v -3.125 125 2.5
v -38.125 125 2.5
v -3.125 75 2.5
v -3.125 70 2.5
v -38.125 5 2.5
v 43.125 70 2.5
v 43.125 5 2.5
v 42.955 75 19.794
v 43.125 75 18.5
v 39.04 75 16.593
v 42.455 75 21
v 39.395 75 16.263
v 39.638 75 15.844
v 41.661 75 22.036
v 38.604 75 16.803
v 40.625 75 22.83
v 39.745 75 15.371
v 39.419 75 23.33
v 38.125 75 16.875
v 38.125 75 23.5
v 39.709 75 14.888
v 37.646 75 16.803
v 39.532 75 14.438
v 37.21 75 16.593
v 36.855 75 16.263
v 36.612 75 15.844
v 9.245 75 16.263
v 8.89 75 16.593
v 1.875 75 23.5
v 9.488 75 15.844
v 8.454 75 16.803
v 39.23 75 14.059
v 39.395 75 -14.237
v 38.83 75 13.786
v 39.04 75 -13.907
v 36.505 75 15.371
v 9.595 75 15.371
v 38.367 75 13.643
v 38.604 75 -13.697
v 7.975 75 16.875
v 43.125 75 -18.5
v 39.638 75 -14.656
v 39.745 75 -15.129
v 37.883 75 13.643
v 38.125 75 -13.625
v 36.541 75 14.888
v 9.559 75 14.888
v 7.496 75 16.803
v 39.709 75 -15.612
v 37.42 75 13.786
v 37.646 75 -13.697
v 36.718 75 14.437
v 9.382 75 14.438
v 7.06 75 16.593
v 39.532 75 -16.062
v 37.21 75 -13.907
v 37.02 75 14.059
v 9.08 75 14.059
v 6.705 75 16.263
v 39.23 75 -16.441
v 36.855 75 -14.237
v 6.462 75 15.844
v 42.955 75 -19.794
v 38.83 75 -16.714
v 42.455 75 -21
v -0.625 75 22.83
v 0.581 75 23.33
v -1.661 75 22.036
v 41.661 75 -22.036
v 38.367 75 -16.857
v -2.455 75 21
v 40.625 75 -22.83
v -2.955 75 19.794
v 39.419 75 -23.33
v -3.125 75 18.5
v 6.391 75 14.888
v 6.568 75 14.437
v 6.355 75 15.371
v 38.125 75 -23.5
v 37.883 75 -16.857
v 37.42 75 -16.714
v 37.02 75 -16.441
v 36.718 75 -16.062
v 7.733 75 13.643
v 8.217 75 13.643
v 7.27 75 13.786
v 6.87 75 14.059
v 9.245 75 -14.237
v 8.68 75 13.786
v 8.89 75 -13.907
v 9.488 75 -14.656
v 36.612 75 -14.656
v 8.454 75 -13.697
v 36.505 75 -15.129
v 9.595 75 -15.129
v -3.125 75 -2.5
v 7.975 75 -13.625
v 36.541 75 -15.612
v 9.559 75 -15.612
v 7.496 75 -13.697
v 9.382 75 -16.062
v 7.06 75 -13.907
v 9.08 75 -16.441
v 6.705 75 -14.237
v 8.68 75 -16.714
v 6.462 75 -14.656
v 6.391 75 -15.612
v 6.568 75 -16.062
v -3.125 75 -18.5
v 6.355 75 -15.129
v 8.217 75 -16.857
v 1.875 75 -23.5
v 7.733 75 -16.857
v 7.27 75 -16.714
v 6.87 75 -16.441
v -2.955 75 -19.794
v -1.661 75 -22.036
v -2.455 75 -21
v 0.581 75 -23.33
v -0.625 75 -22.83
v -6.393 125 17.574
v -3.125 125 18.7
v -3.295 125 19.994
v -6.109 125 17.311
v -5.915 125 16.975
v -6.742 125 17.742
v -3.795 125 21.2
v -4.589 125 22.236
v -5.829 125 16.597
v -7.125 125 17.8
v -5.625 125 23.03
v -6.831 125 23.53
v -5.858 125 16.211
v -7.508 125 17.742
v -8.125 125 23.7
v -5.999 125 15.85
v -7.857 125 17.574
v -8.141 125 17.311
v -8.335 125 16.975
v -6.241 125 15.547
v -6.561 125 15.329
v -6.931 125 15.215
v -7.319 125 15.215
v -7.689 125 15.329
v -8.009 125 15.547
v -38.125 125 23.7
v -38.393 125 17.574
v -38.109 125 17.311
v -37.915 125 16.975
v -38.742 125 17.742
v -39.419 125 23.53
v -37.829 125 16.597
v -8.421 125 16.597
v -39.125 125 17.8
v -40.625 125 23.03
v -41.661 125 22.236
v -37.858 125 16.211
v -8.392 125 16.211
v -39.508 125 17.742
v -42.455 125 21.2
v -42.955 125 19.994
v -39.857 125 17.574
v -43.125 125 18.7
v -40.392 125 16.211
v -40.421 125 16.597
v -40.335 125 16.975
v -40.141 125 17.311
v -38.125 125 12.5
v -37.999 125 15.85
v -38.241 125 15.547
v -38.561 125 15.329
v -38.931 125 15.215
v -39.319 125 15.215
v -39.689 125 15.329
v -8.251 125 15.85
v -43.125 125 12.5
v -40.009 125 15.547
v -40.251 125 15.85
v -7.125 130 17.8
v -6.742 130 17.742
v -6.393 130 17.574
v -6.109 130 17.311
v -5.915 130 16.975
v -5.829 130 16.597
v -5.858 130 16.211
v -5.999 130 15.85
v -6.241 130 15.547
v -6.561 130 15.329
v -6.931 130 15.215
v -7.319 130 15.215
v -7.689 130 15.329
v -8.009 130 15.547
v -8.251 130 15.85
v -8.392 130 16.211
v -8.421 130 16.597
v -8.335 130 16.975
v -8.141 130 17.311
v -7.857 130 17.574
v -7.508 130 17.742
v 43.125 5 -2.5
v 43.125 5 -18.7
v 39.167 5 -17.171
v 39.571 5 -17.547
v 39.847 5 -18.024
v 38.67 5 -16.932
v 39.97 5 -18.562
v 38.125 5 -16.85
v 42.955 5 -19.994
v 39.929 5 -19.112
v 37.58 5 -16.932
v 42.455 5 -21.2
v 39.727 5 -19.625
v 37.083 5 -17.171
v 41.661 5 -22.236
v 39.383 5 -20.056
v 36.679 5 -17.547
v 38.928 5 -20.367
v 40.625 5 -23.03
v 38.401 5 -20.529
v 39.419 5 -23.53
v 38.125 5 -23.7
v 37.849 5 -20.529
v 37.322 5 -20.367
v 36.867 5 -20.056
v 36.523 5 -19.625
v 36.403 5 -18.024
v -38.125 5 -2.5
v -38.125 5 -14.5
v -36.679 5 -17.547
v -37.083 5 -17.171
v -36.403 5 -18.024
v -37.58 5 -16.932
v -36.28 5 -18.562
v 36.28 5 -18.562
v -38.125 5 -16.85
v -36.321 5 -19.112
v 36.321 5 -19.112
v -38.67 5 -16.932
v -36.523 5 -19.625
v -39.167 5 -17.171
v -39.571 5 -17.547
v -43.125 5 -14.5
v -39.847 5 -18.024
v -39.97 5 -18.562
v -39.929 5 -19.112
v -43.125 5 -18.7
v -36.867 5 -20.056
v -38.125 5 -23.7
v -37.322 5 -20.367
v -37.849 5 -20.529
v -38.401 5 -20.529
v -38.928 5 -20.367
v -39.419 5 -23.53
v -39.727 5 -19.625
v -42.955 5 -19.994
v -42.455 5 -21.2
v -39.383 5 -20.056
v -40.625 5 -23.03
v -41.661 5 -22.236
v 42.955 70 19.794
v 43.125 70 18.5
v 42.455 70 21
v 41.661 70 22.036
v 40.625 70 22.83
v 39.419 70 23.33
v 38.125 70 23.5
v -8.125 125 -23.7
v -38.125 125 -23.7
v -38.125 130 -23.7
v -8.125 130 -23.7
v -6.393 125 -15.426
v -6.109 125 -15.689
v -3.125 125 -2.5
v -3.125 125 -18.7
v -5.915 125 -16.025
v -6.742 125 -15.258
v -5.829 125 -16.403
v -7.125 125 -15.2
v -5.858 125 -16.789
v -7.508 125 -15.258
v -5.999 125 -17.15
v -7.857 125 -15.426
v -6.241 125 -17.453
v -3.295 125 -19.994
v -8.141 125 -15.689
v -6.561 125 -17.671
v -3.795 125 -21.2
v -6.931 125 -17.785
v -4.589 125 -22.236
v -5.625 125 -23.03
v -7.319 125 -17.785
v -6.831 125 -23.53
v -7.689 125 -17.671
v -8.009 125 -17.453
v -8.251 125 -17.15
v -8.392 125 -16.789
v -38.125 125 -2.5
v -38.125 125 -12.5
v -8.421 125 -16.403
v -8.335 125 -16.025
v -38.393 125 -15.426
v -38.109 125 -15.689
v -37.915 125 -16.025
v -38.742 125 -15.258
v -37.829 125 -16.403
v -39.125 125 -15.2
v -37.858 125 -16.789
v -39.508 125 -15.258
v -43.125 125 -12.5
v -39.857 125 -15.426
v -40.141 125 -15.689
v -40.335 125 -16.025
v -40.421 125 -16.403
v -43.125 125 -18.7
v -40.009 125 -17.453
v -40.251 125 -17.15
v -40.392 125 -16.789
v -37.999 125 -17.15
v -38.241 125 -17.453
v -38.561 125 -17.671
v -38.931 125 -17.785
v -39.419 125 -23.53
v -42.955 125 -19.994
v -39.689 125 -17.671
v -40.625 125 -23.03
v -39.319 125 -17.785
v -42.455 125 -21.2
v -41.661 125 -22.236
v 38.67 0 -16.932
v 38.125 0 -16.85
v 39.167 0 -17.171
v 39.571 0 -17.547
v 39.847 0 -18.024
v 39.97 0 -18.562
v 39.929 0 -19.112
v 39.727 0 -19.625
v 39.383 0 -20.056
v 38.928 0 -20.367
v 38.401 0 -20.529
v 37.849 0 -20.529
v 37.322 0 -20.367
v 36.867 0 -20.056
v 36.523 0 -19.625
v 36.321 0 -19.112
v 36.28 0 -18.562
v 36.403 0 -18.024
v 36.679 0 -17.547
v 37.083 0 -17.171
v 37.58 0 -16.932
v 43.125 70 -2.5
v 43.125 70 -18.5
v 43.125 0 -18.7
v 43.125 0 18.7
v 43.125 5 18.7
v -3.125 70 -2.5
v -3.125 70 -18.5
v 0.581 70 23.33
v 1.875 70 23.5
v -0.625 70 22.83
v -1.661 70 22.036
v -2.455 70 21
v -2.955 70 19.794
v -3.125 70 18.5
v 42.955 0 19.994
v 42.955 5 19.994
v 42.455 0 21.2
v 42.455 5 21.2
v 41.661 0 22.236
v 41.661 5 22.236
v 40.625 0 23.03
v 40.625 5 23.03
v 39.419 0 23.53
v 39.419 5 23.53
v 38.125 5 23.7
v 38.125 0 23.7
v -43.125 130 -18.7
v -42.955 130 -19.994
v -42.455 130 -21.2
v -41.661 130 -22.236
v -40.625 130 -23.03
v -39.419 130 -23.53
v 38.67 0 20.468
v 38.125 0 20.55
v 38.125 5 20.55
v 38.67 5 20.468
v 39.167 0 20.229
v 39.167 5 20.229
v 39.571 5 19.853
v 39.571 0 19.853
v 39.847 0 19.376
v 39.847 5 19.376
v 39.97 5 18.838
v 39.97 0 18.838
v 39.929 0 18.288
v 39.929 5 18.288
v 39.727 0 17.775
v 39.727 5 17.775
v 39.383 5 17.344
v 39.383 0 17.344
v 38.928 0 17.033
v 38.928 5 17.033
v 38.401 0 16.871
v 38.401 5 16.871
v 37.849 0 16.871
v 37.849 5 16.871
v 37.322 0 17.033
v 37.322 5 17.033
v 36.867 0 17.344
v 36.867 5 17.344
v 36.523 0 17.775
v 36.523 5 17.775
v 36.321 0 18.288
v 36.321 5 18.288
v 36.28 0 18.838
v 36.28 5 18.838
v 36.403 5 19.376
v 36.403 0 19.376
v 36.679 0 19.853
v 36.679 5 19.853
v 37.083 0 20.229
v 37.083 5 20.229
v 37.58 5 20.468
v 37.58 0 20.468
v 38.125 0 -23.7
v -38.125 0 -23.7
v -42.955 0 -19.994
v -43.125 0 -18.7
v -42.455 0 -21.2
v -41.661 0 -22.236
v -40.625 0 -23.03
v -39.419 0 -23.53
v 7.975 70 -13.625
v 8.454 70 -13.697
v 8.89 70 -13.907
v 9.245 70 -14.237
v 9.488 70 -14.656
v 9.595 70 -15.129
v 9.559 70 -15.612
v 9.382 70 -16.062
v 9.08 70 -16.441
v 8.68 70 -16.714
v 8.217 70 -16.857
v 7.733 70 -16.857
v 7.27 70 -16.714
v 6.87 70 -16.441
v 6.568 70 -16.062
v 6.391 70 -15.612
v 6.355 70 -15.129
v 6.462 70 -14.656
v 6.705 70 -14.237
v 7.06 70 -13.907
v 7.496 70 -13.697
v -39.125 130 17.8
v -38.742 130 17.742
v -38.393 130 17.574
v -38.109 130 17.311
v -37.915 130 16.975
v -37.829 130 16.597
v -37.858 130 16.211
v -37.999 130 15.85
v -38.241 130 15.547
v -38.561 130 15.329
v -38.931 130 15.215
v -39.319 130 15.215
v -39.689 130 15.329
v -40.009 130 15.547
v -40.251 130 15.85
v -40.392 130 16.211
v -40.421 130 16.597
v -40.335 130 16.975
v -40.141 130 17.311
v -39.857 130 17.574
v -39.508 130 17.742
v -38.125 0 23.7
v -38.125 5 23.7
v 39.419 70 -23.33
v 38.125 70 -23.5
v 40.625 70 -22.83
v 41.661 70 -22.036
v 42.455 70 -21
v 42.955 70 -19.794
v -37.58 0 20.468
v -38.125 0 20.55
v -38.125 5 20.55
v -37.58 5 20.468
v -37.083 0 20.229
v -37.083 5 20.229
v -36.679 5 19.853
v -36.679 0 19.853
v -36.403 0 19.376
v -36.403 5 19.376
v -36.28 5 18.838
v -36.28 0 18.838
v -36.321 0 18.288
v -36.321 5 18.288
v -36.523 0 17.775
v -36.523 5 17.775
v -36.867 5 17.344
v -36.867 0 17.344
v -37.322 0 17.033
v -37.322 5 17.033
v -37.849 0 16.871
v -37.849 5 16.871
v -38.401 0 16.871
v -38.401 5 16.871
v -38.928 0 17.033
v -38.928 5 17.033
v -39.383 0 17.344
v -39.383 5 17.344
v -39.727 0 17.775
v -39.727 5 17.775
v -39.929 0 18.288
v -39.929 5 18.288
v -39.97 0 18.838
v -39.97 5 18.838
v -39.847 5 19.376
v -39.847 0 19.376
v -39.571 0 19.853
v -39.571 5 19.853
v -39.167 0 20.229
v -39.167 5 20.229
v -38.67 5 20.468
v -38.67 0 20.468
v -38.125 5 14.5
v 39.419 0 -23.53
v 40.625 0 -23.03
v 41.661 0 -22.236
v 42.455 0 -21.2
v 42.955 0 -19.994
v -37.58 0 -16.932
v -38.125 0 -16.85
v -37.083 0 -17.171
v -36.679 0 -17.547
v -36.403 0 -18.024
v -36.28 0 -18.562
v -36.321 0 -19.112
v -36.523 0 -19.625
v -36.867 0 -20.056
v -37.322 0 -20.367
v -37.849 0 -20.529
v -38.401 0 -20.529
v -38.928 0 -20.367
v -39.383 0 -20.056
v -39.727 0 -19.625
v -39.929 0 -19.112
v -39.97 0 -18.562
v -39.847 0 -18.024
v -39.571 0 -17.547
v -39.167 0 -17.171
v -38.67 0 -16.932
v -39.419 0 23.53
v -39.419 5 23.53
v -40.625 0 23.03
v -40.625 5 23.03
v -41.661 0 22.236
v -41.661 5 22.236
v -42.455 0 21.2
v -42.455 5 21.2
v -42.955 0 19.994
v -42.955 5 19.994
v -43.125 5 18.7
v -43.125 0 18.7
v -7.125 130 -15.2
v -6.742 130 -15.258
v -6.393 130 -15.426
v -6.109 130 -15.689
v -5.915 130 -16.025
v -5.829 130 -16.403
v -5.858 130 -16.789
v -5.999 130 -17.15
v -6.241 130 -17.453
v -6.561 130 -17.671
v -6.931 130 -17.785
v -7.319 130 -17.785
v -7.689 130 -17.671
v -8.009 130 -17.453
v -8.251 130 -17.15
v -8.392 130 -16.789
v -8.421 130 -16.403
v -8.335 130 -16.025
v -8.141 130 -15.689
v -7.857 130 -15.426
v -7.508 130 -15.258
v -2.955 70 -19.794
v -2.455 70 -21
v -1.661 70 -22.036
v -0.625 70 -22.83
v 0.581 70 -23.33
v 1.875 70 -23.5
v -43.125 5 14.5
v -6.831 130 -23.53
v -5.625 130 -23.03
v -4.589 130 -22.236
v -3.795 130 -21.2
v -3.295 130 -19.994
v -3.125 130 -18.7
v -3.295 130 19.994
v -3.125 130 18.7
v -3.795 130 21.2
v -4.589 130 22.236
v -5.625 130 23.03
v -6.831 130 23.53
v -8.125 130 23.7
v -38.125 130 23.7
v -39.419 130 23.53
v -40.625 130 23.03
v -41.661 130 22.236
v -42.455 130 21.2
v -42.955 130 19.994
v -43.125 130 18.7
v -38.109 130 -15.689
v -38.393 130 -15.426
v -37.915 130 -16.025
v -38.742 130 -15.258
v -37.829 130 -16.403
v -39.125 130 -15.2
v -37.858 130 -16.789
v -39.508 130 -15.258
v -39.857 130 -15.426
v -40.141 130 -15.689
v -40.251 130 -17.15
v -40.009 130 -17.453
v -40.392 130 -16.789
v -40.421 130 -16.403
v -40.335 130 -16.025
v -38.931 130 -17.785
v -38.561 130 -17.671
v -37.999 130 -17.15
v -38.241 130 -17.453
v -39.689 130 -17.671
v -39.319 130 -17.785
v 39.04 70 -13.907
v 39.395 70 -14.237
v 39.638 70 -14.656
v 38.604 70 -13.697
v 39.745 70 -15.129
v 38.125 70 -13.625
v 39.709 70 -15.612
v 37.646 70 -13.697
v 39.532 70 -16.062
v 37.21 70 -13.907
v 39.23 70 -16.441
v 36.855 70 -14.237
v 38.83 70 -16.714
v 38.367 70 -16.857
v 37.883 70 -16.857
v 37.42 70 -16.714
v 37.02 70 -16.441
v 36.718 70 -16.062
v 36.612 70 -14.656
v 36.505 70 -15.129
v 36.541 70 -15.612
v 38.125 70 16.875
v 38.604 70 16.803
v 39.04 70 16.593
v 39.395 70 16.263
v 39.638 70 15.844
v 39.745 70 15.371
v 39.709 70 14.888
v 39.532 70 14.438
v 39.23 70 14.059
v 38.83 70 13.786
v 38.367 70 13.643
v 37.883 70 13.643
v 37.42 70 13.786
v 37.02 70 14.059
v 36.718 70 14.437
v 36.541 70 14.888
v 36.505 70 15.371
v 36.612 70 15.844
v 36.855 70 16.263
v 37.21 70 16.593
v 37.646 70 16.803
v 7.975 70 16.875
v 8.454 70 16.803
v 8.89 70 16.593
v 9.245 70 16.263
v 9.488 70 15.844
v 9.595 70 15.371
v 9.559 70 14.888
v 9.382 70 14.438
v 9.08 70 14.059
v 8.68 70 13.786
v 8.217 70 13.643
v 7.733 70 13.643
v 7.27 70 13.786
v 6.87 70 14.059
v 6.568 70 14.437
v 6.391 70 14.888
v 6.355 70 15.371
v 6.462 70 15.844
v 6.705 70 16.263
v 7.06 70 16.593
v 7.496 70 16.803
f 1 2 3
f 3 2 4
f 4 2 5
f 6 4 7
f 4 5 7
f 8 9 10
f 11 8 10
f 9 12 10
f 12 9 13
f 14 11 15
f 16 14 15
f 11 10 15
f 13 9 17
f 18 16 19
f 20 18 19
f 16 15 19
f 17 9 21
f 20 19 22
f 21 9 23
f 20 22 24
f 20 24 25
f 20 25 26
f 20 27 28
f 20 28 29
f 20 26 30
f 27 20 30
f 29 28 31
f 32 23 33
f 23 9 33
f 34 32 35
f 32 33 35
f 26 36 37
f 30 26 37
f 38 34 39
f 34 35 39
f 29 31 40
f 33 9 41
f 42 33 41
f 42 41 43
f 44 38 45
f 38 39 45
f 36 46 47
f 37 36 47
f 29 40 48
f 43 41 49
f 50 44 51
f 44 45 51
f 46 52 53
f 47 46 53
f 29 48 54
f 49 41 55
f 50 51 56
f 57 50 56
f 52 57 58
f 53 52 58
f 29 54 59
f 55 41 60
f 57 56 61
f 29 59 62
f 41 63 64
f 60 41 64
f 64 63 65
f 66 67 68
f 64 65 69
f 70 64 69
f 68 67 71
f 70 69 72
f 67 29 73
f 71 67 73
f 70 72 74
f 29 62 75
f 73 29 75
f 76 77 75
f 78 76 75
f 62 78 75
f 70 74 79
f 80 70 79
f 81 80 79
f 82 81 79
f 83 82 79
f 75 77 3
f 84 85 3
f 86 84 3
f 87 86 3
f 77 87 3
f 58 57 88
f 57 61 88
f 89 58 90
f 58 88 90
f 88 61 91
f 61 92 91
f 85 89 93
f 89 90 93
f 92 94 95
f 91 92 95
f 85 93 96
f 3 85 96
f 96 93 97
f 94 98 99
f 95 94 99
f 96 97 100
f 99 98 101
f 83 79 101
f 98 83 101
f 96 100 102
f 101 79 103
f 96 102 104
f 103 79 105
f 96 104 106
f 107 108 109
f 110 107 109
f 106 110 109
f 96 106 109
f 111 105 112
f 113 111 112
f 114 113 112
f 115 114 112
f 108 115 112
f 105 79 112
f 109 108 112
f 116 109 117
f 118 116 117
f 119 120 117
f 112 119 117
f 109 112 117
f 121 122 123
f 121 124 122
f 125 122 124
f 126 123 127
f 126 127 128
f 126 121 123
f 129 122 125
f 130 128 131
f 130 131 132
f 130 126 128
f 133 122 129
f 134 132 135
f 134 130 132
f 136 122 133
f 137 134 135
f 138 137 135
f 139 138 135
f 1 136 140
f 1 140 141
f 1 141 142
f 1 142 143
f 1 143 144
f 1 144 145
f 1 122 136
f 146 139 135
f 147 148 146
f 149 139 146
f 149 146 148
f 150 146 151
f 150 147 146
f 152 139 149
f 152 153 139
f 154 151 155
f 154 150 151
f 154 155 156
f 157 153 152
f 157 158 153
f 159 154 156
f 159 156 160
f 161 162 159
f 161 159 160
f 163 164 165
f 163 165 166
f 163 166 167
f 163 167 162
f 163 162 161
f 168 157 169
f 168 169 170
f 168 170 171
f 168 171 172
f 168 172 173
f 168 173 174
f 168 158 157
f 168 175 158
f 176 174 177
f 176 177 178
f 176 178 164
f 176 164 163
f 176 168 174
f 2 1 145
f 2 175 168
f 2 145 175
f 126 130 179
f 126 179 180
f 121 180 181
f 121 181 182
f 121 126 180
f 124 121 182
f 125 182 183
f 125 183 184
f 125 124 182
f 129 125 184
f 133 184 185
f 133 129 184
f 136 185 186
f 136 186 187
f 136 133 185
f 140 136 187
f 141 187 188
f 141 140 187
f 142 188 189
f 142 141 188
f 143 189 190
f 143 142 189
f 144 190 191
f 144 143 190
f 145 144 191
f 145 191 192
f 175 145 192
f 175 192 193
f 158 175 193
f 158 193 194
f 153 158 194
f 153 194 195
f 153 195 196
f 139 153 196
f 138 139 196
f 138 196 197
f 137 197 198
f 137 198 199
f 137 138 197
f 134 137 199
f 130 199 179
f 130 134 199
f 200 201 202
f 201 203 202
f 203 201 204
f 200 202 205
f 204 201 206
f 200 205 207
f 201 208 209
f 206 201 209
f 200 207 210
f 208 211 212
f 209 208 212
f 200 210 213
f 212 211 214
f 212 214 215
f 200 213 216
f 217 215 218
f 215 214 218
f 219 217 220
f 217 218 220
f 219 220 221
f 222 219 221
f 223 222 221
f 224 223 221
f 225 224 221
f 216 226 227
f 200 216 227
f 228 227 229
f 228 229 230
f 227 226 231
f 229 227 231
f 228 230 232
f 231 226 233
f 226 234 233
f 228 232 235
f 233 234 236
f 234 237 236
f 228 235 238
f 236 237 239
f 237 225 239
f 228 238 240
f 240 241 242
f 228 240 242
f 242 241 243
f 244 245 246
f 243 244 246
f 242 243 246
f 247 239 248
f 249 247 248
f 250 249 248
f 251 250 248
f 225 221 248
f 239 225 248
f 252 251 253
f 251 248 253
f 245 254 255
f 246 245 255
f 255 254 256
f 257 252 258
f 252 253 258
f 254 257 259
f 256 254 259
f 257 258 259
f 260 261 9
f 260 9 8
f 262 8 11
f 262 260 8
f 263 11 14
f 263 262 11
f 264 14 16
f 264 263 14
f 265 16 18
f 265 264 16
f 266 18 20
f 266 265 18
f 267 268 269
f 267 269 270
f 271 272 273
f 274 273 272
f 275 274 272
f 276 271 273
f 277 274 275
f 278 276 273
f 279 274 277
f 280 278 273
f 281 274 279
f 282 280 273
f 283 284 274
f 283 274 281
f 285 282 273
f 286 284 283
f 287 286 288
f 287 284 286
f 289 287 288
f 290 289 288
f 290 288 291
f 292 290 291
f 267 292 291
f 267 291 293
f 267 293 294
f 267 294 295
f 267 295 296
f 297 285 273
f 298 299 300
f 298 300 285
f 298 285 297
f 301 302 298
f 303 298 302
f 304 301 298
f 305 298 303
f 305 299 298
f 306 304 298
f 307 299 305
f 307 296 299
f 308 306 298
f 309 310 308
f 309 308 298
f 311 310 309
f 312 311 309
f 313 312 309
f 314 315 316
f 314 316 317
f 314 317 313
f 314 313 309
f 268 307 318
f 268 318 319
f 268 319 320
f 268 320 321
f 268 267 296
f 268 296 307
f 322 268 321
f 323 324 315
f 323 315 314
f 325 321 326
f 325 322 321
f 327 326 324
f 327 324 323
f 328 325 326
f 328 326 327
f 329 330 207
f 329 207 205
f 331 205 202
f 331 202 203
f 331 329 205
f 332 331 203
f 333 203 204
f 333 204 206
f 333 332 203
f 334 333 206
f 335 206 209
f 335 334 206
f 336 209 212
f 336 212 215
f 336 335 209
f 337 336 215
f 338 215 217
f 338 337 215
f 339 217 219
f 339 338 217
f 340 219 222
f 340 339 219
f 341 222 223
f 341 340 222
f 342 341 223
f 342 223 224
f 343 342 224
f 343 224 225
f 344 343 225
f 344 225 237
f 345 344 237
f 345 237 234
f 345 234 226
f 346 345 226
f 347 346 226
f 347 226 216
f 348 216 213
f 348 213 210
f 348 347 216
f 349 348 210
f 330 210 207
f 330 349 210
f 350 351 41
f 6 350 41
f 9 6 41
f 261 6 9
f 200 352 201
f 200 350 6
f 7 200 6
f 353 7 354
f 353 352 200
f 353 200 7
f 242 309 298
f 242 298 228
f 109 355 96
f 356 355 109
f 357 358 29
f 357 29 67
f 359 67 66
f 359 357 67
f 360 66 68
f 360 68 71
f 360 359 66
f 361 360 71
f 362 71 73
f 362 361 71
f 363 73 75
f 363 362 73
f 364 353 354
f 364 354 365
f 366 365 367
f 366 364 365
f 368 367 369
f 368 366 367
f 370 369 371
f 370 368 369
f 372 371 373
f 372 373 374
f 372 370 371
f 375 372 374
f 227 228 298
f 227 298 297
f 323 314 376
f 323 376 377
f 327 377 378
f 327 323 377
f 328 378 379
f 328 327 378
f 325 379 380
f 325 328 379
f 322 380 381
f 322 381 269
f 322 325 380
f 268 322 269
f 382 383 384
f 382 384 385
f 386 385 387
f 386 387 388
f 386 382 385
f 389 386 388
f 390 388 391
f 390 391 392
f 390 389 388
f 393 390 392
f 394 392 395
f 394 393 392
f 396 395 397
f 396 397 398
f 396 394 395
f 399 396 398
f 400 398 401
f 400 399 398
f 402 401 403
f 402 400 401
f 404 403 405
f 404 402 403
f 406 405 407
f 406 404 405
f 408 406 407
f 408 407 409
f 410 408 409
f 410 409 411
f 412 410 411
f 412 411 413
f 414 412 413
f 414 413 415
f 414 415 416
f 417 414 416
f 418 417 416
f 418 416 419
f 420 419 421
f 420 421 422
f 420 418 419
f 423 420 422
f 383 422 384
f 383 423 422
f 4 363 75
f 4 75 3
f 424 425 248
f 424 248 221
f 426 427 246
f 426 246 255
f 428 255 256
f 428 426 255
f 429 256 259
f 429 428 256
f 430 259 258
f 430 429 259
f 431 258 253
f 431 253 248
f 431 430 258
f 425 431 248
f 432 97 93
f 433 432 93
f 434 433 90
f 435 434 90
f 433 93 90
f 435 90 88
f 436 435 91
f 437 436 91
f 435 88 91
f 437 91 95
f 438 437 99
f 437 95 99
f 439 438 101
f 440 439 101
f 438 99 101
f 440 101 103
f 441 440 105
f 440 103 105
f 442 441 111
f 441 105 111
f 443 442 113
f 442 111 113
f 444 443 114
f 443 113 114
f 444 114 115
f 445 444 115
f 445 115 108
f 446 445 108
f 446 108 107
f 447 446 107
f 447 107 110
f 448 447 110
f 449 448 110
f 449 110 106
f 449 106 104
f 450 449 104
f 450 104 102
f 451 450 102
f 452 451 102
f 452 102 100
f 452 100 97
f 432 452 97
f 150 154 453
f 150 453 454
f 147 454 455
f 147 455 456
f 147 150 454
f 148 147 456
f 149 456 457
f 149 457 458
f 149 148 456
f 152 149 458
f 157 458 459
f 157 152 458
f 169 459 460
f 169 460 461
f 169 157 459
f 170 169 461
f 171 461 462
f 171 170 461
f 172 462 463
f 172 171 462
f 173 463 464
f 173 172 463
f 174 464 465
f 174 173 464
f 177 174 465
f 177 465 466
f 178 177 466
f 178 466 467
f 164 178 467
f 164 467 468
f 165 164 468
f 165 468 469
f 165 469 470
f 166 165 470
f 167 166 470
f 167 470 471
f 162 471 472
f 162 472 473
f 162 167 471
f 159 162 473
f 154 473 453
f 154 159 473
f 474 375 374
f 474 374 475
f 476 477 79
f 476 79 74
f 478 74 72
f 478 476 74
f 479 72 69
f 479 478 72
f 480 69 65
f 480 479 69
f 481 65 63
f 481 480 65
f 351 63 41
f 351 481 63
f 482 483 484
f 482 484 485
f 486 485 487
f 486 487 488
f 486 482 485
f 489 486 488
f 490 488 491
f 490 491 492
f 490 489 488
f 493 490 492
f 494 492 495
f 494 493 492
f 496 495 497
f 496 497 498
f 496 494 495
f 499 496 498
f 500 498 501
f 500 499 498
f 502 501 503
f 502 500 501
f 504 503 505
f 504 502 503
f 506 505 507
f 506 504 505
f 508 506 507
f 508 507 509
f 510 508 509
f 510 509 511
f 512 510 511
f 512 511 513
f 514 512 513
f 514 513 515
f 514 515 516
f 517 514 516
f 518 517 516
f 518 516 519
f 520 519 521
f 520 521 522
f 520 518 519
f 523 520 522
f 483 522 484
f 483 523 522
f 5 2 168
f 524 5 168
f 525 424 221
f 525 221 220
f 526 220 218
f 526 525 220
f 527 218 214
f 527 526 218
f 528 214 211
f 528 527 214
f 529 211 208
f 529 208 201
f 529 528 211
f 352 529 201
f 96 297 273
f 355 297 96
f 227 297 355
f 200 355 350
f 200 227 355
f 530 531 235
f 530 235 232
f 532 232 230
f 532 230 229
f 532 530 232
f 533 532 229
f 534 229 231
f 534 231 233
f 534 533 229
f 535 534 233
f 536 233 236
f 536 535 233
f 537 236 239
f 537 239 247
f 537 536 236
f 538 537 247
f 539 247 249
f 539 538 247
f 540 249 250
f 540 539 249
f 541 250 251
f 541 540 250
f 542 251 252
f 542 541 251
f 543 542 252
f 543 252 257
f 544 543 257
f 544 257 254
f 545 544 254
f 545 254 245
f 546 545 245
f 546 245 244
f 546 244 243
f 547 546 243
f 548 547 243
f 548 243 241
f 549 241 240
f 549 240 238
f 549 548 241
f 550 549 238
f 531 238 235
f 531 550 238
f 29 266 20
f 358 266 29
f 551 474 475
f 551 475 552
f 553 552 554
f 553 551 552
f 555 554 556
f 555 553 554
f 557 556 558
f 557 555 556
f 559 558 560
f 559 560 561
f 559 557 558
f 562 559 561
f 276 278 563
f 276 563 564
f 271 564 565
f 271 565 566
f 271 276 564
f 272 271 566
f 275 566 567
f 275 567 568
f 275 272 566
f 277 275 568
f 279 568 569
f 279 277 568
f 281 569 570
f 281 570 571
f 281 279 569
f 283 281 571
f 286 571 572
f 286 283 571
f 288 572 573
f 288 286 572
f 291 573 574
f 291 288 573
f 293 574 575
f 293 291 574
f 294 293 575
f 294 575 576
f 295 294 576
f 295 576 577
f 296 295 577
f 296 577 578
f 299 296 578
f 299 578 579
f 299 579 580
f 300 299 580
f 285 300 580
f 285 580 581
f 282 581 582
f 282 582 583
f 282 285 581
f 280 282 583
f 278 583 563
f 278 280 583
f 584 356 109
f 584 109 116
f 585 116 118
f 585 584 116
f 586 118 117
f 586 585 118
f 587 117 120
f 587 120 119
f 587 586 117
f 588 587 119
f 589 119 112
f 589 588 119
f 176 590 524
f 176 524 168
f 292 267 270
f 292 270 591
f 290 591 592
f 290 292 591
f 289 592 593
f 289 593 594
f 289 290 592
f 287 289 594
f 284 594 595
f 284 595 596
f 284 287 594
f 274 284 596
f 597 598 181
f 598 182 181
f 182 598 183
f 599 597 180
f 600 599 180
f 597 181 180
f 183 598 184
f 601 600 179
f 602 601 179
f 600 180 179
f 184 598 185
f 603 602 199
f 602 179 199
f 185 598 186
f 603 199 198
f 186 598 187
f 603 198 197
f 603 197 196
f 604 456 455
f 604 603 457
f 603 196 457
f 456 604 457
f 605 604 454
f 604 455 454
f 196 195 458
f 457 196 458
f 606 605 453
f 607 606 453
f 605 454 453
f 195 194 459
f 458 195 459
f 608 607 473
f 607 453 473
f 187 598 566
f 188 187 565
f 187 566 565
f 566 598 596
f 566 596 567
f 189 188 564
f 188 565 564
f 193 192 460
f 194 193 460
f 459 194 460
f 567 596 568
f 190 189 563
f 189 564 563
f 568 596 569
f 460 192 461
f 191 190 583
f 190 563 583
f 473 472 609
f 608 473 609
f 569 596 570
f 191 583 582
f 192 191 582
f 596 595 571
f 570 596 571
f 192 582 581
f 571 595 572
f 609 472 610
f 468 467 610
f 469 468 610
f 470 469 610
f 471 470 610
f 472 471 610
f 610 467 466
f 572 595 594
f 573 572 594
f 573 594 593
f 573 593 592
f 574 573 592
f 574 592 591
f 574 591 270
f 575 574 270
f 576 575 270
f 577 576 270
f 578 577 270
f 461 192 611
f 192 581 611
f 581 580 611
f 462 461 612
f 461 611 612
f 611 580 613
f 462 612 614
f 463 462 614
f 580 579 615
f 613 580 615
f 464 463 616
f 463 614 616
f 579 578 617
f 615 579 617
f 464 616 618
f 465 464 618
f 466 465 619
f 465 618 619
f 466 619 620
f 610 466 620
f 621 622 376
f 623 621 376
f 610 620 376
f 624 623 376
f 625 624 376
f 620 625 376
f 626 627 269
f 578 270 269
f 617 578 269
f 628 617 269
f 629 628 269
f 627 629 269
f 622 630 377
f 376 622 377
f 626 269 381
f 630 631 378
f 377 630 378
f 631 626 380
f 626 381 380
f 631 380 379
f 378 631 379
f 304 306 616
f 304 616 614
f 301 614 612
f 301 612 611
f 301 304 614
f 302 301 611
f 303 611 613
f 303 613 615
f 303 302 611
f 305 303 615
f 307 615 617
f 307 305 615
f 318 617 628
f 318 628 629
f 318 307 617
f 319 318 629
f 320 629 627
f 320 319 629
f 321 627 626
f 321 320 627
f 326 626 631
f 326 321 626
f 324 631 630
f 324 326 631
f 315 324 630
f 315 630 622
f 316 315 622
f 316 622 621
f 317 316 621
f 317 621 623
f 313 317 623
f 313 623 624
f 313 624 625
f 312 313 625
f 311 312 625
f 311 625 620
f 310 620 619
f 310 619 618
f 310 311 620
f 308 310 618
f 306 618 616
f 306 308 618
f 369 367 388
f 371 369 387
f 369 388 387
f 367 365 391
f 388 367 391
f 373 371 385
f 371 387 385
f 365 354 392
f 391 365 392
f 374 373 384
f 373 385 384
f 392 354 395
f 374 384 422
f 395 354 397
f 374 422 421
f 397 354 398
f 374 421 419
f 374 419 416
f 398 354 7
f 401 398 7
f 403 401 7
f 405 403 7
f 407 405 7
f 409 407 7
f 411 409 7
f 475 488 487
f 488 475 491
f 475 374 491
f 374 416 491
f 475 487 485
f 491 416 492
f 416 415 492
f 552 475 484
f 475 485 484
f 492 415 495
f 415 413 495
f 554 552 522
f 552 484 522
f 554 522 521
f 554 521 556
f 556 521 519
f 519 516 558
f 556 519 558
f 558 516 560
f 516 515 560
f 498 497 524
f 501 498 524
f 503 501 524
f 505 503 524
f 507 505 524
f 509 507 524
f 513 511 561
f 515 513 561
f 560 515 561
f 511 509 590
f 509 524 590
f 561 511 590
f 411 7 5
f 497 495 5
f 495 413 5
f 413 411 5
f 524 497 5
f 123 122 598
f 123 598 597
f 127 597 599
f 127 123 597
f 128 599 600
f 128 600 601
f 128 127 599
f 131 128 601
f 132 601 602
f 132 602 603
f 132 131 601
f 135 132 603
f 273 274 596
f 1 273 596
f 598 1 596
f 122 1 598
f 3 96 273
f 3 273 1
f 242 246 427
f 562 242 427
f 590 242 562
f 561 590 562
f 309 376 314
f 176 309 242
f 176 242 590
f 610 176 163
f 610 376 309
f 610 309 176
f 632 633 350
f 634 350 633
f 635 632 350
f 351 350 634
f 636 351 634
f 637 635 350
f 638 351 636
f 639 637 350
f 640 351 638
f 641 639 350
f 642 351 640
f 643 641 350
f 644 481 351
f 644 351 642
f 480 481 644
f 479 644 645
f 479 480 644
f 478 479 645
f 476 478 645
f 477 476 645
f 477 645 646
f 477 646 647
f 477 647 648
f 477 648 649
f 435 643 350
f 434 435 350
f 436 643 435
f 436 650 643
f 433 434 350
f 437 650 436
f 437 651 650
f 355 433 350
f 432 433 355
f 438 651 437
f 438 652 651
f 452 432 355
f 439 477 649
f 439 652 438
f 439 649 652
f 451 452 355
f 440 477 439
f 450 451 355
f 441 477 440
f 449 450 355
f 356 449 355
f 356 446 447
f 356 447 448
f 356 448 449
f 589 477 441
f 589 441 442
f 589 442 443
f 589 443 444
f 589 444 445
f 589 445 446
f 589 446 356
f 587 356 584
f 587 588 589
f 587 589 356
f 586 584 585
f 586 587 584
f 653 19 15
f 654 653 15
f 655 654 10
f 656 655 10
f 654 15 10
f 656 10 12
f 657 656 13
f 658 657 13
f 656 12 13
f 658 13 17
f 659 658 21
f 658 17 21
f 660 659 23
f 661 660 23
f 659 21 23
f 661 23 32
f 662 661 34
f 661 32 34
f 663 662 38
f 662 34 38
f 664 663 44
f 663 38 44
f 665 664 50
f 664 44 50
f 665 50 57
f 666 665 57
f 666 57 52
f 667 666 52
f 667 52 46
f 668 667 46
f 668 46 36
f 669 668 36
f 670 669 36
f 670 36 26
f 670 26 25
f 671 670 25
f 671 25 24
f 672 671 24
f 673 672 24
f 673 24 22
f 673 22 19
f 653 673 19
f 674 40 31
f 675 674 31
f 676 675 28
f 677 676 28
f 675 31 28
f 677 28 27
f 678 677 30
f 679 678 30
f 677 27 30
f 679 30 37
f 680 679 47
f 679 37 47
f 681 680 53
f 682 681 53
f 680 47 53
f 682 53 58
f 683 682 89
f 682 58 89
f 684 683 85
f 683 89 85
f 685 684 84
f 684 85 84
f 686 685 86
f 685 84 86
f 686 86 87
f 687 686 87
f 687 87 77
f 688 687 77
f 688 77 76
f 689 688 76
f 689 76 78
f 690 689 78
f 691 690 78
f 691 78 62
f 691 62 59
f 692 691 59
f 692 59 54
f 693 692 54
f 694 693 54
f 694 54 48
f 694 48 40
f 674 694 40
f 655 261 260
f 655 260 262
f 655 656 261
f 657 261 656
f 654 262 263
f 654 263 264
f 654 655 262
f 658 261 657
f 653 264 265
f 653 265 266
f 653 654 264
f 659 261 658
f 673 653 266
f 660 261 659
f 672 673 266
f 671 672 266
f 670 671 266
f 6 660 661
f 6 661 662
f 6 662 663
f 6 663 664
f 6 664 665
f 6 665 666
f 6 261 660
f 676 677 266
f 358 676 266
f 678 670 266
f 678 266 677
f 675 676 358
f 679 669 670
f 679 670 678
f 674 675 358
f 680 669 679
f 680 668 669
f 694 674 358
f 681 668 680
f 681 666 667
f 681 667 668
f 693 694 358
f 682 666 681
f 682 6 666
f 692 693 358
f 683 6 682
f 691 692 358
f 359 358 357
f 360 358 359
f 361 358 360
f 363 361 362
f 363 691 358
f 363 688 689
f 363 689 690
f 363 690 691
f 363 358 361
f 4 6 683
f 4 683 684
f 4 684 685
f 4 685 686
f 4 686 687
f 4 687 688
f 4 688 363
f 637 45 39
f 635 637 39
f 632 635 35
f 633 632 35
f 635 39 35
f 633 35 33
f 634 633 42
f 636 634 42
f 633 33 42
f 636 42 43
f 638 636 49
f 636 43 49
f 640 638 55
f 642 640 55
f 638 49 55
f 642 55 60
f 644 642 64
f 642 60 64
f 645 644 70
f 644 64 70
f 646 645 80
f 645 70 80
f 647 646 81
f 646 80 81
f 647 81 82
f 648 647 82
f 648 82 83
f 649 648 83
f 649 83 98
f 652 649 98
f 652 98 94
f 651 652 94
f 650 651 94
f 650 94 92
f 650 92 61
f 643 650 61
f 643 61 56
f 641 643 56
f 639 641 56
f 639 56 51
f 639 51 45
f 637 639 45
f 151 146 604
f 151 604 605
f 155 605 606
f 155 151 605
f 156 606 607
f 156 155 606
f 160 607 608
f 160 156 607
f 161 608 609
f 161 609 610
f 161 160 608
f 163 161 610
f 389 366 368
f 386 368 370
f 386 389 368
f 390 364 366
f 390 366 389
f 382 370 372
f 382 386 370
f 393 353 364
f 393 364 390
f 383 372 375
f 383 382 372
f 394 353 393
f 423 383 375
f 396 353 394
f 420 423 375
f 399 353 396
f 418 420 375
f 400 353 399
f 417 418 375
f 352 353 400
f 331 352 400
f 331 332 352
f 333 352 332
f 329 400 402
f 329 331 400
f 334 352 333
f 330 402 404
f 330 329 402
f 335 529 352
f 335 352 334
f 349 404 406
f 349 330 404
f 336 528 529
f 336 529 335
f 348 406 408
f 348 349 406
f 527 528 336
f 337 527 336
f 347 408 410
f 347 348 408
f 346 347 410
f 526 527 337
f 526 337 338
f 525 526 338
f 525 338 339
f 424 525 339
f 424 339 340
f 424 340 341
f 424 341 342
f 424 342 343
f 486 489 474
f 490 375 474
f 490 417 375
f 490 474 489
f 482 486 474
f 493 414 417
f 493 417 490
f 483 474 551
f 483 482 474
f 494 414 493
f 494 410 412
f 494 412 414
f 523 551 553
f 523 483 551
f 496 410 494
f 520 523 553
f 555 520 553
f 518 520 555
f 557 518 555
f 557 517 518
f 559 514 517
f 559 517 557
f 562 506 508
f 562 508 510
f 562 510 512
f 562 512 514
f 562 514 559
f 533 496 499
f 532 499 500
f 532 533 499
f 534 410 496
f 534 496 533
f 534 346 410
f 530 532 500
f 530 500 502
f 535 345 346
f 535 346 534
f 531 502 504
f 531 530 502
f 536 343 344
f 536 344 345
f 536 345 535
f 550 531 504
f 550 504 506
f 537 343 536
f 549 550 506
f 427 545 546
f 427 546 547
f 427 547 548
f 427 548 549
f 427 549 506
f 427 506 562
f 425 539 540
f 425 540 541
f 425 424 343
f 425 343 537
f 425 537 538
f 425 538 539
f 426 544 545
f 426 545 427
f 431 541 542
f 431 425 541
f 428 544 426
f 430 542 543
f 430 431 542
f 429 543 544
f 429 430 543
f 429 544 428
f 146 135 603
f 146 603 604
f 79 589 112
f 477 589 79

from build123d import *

# Parameters (mm, degrees)
SKT_BASE_W_MOUNTING_HOLES_R           = 1.85
EXT_BASE_PLATE_W_MOUNTING_HOLES_DEPTH = 5
SKT_UPWARD_RIDGE_W                    = 86.25
SKT_UPWARD_RIDGE_H                    = 5
EXT_UPWARD_FLANGE_DEPTH               = 65
EXT_PIX_PLATFORM_DEPTH                = 5
PIX_MOUNT_HOLES_REACH                 = 91.702
SKETCH7_R                             = 1.625
SKETCH8_W                             = 40
SKETCH8_H                             = 5
GPS_FLANGE_DEPTH                      = 55
SKETCH9_R                             = 1.3
GPS_PLATFORM_DEPTH                    = 5
BRACING_DEPTH                         = 5


with BuildPart() as part:
    # Skt - Base w mounting holes → Ext - Base Plate w Mounting Holes (new body)
    with BuildSketch(Plane(origin=(0, 0, 0), x_dir=(1, 0, 0), z_dir=(0, 1, 0))):
        with BuildLine():
            Line((-38.125, 23.7), (38.125, 23.7))
            ThreePointArc((38.125, 23.7), (41.660533906, 22.235533906), (43.125, 18.7))
            Line((43.125, 18.7), (43.125, -18.7))
            ThreePointArc((43.125, -18.7), (41.660533906, -22.235533906), (38.125, -23.7))
            Line((38.125, -23.7), (-38.125, -23.7))
            ThreePointArc((-38.125, -23.7), (-41.660533906, -22.235533906), (-43.125, -18.7))
            Line((-43.125, -18.7), (-43.125, 18.7))
            ThreePointArc((-43.125, 18.7), (-41.660533906, 22.235533906), (-38.125, 23.7))
        make_face()
        with Locations(Location((-38.125, 18.7, 0), (0, 0, 270))):
            Circle(SKT_BASE_W_MOUNTING_HOLES_R, mode=Mode.SUBTRACT)
        with Locations(Location((38.125, 18.7, 0), (0, 0, 270))):
            Circle(SKT_BASE_W_MOUNTING_HOLES_R, mode=Mode.SUBTRACT)
        with Locations(Location((38.125, -18.7, 0), (0, 0, 270))):
            Circle(SKT_BASE_W_MOUNTING_HOLES_R, mode=Mode.SUBTRACT)
        with Locations(Location((-38.125, -18.7, 0), (0, 0, 270))):
            Circle(SKT_BASE_W_MOUNTING_HOLES_R, mode=Mode.SUBTRACT)
    extrude(amount=EXT_BASE_PLATE_W_MOUNTING_HOLES_DEPTH)

    # Skt - Upward Ridge → Ext - Upward Flange (add)
    with BuildSketch(Plane(origin=(0, 5, 0), x_dir=(1, 0, 0), z_dir=(0, 1, 0))):
        Rectangle(SKT_UPWARD_RIDGE_W, SKT_UPWARD_RIDGE_H)
    extrude(amount=EXT_UPWARD_FLANGE_DEPTH)

    # Skt - GPS Nest → Ext - PIX Platform (add)
    with BuildSketch(Plane(origin=(0, 70, 0), x_dir=(1, 0, 0), z_dir=(0, 1, 0))):
        with BuildLine():
            Line((1.875, 23.5), (38.125, 23.5))
            ThreePointArc((38.125, 23.5), (41.660533906, 22.035533906), (43.125, 18.5))
            Line((43.125, 18.5), (43.125, -18.5))
            ThreePointArc((43.125, -18.5), (41.660533906, -22.035533906), (38.125, -23.5))
            Line((38.125, -23.5), (1.875, -23.5))
            ThreePointArc((1.875, -23.5), (-1.660533906, -22.035533906), (-3.125, -18.5))
            Line((-3.125, -18.5), (-3.125, 18.5))
            ThreePointArc((-3.125, 18.5), (-1.660533906, 22.035533906), (1.875, 23.5))
        make_face()
    extrude(amount=EXT_PIX_PLATFORM_DEPTH)

    # Sketch7 → Pix Mount Holes (cut, up to next)
    with BuildSketch(Plane(origin=(0, 75, 0), x_dir=(1, 0, 0), z_dir=(0, 1, 0)), mode=Mode.PRIVATE) as pix_mount_holes_sk1:
        with Locations(Location((7.975, 15.25, 0), (0, 0, 270))):
            Circle(SKETCH7_R)
    pix_mount_holes_tool1 = extrude(pix_mount_holes_sk1.sketch, amount=-PIX_MOUNT_HOLES_REACH, mode=Mode.PRIVATE) & part.part
    # Sketch7 → Pix Mount Holes (cut, up to next)
    with BuildSketch(Plane(origin=(0, 75, 0), x_dir=(1, 0, 0), z_dir=(0, 1, 0)), mode=Mode.PRIVATE) as pix_mount_holes_sk2:
        with Locations(Location((38.125, 15.25, 0), (0, 0, 270))):
            Circle(SKETCH7_R)
    pix_mount_holes_tool2 = extrude(pix_mount_holes_sk2.sketch, amount=-PIX_MOUNT_HOLES_REACH, mode=Mode.PRIVATE) & part.part
    # Sketch7 → Pix Mount Holes (cut, up to next)
    with BuildSketch(Plane(origin=(0, 75, 0), x_dir=(1, 0, 0), z_dir=(0, 1, 0)), mode=Mode.PRIVATE) as pix_mount_holes_sk3:
        with Locations(Location((38.125, -15.25, 0), (0, 0, 270))):
            Circle(SKETCH7_R)
    pix_mount_holes_tool3 = extrude(pix_mount_holes_sk3.sketch, amount=-PIX_MOUNT_HOLES_REACH, mode=Mode.PRIVATE) & part.part
    # Sketch7 → Pix Mount Holes (cut, up to next)
    with BuildSketch(Plane(origin=(0, 75, 0), x_dir=(1, 0, 0), z_dir=(0, 1, 0)), mode=Mode.PRIVATE) as pix_mount_holes_sk4:
        with Locations(Location((7.975, -15.25, 0), (0, 0, 270))):
            Circle(SKETCH7_R)
    pix_mount_holes_tool4 = extrude(pix_mount_holes_sk4.sketch, amount=-PIX_MOUNT_HOLES_REACH, mode=Mode.PRIVATE) & part.part
    add(pix_mount_holes_tool1.solids().sort_by_distance((7.975, 75, -15.25))[0], mode=Mode.SUBTRACT)
    add(pix_mount_holes_tool2.solids().sort_by_distance((38.125, 75, -15.25))[0], mode=Mode.SUBTRACT)
    add(pix_mount_holes_tool3.solids().sort_by_distance((38.125, 75, 15.25))[0], mode=Mode.SUBTRACT)
    add(pix_mount_holes_tool4.solids().sort_by_distance((7.975, 75, 15.25))[0], mode=Mode.SUBTRACT)

    # Sketch8 → GPS Flange (add)
    with BuildSketch(Plane(origin=(0, 70, 0), x_dir=(1, 0, 0), z_dir=(0, 1, 0))):
        with Locations((-23.125, 0)):
            Rectangle(SKETCH8_W, SKETCH8_H)
    extrude(amount=GPS_FLANGE_DEPTH)

    # Sketch9 → GPS Platform (add)
    with BuildSketch(Plane(origin=(0, 125, 0), x_dir=(1, 0, 0), z_dir=(0, 1, 0))):
        with BuildLine():
            Line((-38.125, 23.7), (-8.125, 23.7))
            ThreePointArc((-8.125, 23.7), (-4.589466094, 22.235533906), (-3.125, 18.7))
            Line((-3.125, 18.7), (-3.125, -18.7))
            ThreePointArc((-3.125, -18.7), (-4.589466094, -22.235533906), (-8.125, -23.7))
            Line((-8.125, -23.7), (-38.125, -23.7))
            ThreePointArc((-38.125, -23.7), (-41.660533906, -22.235533906), (-43.125, -18.7))
            Line((-43.125, -18.7), (-43.125, 18.7))
            ThreePointArc((-43.125, 18.7), (-41.660533906, 22.235533906), (-38.125, 23.7))
        make_face()
        with Locations(Location((-39.125, 16.5, 0), (0, 0, 270))):
            Circle(SKETCH9_R, mode=Mode.SUBTRACT)
        with Locations(Location((-7.125, 16.5, 0), (0, 0, 270))):
            Circle(SKETCH9_R, mode=Mode.SUBTRACT)
        with Locations(Location((-7.125, -16.5, 0), (0, 0, 270))):
            Circle(SKETCH9_R, mode=Mode.SUBTRACT)
        with Locations(Location((-39.125, -16.5, 0), (0, 0, 270))):
            Circle(SKETCH9_R, mode=Mode.SUBTRACT)
    extrude(amount=GPS_PLATFORM_DEPTH)

    # Sketch10 → Bracing (add)
    with BuildSketch(Plane.ZY.offset(43.125)):
        Polygon((-2.5, 5), (-2.5, 125), (-12.5, 125), (-14.5, 5), align=None)
        Polygon((2.5, 125), (2.5, 5), (14.5, 5), (12.5, 125), align=None)
    extrude(amount=-BRACING_DEPTH)


solid = part.part
